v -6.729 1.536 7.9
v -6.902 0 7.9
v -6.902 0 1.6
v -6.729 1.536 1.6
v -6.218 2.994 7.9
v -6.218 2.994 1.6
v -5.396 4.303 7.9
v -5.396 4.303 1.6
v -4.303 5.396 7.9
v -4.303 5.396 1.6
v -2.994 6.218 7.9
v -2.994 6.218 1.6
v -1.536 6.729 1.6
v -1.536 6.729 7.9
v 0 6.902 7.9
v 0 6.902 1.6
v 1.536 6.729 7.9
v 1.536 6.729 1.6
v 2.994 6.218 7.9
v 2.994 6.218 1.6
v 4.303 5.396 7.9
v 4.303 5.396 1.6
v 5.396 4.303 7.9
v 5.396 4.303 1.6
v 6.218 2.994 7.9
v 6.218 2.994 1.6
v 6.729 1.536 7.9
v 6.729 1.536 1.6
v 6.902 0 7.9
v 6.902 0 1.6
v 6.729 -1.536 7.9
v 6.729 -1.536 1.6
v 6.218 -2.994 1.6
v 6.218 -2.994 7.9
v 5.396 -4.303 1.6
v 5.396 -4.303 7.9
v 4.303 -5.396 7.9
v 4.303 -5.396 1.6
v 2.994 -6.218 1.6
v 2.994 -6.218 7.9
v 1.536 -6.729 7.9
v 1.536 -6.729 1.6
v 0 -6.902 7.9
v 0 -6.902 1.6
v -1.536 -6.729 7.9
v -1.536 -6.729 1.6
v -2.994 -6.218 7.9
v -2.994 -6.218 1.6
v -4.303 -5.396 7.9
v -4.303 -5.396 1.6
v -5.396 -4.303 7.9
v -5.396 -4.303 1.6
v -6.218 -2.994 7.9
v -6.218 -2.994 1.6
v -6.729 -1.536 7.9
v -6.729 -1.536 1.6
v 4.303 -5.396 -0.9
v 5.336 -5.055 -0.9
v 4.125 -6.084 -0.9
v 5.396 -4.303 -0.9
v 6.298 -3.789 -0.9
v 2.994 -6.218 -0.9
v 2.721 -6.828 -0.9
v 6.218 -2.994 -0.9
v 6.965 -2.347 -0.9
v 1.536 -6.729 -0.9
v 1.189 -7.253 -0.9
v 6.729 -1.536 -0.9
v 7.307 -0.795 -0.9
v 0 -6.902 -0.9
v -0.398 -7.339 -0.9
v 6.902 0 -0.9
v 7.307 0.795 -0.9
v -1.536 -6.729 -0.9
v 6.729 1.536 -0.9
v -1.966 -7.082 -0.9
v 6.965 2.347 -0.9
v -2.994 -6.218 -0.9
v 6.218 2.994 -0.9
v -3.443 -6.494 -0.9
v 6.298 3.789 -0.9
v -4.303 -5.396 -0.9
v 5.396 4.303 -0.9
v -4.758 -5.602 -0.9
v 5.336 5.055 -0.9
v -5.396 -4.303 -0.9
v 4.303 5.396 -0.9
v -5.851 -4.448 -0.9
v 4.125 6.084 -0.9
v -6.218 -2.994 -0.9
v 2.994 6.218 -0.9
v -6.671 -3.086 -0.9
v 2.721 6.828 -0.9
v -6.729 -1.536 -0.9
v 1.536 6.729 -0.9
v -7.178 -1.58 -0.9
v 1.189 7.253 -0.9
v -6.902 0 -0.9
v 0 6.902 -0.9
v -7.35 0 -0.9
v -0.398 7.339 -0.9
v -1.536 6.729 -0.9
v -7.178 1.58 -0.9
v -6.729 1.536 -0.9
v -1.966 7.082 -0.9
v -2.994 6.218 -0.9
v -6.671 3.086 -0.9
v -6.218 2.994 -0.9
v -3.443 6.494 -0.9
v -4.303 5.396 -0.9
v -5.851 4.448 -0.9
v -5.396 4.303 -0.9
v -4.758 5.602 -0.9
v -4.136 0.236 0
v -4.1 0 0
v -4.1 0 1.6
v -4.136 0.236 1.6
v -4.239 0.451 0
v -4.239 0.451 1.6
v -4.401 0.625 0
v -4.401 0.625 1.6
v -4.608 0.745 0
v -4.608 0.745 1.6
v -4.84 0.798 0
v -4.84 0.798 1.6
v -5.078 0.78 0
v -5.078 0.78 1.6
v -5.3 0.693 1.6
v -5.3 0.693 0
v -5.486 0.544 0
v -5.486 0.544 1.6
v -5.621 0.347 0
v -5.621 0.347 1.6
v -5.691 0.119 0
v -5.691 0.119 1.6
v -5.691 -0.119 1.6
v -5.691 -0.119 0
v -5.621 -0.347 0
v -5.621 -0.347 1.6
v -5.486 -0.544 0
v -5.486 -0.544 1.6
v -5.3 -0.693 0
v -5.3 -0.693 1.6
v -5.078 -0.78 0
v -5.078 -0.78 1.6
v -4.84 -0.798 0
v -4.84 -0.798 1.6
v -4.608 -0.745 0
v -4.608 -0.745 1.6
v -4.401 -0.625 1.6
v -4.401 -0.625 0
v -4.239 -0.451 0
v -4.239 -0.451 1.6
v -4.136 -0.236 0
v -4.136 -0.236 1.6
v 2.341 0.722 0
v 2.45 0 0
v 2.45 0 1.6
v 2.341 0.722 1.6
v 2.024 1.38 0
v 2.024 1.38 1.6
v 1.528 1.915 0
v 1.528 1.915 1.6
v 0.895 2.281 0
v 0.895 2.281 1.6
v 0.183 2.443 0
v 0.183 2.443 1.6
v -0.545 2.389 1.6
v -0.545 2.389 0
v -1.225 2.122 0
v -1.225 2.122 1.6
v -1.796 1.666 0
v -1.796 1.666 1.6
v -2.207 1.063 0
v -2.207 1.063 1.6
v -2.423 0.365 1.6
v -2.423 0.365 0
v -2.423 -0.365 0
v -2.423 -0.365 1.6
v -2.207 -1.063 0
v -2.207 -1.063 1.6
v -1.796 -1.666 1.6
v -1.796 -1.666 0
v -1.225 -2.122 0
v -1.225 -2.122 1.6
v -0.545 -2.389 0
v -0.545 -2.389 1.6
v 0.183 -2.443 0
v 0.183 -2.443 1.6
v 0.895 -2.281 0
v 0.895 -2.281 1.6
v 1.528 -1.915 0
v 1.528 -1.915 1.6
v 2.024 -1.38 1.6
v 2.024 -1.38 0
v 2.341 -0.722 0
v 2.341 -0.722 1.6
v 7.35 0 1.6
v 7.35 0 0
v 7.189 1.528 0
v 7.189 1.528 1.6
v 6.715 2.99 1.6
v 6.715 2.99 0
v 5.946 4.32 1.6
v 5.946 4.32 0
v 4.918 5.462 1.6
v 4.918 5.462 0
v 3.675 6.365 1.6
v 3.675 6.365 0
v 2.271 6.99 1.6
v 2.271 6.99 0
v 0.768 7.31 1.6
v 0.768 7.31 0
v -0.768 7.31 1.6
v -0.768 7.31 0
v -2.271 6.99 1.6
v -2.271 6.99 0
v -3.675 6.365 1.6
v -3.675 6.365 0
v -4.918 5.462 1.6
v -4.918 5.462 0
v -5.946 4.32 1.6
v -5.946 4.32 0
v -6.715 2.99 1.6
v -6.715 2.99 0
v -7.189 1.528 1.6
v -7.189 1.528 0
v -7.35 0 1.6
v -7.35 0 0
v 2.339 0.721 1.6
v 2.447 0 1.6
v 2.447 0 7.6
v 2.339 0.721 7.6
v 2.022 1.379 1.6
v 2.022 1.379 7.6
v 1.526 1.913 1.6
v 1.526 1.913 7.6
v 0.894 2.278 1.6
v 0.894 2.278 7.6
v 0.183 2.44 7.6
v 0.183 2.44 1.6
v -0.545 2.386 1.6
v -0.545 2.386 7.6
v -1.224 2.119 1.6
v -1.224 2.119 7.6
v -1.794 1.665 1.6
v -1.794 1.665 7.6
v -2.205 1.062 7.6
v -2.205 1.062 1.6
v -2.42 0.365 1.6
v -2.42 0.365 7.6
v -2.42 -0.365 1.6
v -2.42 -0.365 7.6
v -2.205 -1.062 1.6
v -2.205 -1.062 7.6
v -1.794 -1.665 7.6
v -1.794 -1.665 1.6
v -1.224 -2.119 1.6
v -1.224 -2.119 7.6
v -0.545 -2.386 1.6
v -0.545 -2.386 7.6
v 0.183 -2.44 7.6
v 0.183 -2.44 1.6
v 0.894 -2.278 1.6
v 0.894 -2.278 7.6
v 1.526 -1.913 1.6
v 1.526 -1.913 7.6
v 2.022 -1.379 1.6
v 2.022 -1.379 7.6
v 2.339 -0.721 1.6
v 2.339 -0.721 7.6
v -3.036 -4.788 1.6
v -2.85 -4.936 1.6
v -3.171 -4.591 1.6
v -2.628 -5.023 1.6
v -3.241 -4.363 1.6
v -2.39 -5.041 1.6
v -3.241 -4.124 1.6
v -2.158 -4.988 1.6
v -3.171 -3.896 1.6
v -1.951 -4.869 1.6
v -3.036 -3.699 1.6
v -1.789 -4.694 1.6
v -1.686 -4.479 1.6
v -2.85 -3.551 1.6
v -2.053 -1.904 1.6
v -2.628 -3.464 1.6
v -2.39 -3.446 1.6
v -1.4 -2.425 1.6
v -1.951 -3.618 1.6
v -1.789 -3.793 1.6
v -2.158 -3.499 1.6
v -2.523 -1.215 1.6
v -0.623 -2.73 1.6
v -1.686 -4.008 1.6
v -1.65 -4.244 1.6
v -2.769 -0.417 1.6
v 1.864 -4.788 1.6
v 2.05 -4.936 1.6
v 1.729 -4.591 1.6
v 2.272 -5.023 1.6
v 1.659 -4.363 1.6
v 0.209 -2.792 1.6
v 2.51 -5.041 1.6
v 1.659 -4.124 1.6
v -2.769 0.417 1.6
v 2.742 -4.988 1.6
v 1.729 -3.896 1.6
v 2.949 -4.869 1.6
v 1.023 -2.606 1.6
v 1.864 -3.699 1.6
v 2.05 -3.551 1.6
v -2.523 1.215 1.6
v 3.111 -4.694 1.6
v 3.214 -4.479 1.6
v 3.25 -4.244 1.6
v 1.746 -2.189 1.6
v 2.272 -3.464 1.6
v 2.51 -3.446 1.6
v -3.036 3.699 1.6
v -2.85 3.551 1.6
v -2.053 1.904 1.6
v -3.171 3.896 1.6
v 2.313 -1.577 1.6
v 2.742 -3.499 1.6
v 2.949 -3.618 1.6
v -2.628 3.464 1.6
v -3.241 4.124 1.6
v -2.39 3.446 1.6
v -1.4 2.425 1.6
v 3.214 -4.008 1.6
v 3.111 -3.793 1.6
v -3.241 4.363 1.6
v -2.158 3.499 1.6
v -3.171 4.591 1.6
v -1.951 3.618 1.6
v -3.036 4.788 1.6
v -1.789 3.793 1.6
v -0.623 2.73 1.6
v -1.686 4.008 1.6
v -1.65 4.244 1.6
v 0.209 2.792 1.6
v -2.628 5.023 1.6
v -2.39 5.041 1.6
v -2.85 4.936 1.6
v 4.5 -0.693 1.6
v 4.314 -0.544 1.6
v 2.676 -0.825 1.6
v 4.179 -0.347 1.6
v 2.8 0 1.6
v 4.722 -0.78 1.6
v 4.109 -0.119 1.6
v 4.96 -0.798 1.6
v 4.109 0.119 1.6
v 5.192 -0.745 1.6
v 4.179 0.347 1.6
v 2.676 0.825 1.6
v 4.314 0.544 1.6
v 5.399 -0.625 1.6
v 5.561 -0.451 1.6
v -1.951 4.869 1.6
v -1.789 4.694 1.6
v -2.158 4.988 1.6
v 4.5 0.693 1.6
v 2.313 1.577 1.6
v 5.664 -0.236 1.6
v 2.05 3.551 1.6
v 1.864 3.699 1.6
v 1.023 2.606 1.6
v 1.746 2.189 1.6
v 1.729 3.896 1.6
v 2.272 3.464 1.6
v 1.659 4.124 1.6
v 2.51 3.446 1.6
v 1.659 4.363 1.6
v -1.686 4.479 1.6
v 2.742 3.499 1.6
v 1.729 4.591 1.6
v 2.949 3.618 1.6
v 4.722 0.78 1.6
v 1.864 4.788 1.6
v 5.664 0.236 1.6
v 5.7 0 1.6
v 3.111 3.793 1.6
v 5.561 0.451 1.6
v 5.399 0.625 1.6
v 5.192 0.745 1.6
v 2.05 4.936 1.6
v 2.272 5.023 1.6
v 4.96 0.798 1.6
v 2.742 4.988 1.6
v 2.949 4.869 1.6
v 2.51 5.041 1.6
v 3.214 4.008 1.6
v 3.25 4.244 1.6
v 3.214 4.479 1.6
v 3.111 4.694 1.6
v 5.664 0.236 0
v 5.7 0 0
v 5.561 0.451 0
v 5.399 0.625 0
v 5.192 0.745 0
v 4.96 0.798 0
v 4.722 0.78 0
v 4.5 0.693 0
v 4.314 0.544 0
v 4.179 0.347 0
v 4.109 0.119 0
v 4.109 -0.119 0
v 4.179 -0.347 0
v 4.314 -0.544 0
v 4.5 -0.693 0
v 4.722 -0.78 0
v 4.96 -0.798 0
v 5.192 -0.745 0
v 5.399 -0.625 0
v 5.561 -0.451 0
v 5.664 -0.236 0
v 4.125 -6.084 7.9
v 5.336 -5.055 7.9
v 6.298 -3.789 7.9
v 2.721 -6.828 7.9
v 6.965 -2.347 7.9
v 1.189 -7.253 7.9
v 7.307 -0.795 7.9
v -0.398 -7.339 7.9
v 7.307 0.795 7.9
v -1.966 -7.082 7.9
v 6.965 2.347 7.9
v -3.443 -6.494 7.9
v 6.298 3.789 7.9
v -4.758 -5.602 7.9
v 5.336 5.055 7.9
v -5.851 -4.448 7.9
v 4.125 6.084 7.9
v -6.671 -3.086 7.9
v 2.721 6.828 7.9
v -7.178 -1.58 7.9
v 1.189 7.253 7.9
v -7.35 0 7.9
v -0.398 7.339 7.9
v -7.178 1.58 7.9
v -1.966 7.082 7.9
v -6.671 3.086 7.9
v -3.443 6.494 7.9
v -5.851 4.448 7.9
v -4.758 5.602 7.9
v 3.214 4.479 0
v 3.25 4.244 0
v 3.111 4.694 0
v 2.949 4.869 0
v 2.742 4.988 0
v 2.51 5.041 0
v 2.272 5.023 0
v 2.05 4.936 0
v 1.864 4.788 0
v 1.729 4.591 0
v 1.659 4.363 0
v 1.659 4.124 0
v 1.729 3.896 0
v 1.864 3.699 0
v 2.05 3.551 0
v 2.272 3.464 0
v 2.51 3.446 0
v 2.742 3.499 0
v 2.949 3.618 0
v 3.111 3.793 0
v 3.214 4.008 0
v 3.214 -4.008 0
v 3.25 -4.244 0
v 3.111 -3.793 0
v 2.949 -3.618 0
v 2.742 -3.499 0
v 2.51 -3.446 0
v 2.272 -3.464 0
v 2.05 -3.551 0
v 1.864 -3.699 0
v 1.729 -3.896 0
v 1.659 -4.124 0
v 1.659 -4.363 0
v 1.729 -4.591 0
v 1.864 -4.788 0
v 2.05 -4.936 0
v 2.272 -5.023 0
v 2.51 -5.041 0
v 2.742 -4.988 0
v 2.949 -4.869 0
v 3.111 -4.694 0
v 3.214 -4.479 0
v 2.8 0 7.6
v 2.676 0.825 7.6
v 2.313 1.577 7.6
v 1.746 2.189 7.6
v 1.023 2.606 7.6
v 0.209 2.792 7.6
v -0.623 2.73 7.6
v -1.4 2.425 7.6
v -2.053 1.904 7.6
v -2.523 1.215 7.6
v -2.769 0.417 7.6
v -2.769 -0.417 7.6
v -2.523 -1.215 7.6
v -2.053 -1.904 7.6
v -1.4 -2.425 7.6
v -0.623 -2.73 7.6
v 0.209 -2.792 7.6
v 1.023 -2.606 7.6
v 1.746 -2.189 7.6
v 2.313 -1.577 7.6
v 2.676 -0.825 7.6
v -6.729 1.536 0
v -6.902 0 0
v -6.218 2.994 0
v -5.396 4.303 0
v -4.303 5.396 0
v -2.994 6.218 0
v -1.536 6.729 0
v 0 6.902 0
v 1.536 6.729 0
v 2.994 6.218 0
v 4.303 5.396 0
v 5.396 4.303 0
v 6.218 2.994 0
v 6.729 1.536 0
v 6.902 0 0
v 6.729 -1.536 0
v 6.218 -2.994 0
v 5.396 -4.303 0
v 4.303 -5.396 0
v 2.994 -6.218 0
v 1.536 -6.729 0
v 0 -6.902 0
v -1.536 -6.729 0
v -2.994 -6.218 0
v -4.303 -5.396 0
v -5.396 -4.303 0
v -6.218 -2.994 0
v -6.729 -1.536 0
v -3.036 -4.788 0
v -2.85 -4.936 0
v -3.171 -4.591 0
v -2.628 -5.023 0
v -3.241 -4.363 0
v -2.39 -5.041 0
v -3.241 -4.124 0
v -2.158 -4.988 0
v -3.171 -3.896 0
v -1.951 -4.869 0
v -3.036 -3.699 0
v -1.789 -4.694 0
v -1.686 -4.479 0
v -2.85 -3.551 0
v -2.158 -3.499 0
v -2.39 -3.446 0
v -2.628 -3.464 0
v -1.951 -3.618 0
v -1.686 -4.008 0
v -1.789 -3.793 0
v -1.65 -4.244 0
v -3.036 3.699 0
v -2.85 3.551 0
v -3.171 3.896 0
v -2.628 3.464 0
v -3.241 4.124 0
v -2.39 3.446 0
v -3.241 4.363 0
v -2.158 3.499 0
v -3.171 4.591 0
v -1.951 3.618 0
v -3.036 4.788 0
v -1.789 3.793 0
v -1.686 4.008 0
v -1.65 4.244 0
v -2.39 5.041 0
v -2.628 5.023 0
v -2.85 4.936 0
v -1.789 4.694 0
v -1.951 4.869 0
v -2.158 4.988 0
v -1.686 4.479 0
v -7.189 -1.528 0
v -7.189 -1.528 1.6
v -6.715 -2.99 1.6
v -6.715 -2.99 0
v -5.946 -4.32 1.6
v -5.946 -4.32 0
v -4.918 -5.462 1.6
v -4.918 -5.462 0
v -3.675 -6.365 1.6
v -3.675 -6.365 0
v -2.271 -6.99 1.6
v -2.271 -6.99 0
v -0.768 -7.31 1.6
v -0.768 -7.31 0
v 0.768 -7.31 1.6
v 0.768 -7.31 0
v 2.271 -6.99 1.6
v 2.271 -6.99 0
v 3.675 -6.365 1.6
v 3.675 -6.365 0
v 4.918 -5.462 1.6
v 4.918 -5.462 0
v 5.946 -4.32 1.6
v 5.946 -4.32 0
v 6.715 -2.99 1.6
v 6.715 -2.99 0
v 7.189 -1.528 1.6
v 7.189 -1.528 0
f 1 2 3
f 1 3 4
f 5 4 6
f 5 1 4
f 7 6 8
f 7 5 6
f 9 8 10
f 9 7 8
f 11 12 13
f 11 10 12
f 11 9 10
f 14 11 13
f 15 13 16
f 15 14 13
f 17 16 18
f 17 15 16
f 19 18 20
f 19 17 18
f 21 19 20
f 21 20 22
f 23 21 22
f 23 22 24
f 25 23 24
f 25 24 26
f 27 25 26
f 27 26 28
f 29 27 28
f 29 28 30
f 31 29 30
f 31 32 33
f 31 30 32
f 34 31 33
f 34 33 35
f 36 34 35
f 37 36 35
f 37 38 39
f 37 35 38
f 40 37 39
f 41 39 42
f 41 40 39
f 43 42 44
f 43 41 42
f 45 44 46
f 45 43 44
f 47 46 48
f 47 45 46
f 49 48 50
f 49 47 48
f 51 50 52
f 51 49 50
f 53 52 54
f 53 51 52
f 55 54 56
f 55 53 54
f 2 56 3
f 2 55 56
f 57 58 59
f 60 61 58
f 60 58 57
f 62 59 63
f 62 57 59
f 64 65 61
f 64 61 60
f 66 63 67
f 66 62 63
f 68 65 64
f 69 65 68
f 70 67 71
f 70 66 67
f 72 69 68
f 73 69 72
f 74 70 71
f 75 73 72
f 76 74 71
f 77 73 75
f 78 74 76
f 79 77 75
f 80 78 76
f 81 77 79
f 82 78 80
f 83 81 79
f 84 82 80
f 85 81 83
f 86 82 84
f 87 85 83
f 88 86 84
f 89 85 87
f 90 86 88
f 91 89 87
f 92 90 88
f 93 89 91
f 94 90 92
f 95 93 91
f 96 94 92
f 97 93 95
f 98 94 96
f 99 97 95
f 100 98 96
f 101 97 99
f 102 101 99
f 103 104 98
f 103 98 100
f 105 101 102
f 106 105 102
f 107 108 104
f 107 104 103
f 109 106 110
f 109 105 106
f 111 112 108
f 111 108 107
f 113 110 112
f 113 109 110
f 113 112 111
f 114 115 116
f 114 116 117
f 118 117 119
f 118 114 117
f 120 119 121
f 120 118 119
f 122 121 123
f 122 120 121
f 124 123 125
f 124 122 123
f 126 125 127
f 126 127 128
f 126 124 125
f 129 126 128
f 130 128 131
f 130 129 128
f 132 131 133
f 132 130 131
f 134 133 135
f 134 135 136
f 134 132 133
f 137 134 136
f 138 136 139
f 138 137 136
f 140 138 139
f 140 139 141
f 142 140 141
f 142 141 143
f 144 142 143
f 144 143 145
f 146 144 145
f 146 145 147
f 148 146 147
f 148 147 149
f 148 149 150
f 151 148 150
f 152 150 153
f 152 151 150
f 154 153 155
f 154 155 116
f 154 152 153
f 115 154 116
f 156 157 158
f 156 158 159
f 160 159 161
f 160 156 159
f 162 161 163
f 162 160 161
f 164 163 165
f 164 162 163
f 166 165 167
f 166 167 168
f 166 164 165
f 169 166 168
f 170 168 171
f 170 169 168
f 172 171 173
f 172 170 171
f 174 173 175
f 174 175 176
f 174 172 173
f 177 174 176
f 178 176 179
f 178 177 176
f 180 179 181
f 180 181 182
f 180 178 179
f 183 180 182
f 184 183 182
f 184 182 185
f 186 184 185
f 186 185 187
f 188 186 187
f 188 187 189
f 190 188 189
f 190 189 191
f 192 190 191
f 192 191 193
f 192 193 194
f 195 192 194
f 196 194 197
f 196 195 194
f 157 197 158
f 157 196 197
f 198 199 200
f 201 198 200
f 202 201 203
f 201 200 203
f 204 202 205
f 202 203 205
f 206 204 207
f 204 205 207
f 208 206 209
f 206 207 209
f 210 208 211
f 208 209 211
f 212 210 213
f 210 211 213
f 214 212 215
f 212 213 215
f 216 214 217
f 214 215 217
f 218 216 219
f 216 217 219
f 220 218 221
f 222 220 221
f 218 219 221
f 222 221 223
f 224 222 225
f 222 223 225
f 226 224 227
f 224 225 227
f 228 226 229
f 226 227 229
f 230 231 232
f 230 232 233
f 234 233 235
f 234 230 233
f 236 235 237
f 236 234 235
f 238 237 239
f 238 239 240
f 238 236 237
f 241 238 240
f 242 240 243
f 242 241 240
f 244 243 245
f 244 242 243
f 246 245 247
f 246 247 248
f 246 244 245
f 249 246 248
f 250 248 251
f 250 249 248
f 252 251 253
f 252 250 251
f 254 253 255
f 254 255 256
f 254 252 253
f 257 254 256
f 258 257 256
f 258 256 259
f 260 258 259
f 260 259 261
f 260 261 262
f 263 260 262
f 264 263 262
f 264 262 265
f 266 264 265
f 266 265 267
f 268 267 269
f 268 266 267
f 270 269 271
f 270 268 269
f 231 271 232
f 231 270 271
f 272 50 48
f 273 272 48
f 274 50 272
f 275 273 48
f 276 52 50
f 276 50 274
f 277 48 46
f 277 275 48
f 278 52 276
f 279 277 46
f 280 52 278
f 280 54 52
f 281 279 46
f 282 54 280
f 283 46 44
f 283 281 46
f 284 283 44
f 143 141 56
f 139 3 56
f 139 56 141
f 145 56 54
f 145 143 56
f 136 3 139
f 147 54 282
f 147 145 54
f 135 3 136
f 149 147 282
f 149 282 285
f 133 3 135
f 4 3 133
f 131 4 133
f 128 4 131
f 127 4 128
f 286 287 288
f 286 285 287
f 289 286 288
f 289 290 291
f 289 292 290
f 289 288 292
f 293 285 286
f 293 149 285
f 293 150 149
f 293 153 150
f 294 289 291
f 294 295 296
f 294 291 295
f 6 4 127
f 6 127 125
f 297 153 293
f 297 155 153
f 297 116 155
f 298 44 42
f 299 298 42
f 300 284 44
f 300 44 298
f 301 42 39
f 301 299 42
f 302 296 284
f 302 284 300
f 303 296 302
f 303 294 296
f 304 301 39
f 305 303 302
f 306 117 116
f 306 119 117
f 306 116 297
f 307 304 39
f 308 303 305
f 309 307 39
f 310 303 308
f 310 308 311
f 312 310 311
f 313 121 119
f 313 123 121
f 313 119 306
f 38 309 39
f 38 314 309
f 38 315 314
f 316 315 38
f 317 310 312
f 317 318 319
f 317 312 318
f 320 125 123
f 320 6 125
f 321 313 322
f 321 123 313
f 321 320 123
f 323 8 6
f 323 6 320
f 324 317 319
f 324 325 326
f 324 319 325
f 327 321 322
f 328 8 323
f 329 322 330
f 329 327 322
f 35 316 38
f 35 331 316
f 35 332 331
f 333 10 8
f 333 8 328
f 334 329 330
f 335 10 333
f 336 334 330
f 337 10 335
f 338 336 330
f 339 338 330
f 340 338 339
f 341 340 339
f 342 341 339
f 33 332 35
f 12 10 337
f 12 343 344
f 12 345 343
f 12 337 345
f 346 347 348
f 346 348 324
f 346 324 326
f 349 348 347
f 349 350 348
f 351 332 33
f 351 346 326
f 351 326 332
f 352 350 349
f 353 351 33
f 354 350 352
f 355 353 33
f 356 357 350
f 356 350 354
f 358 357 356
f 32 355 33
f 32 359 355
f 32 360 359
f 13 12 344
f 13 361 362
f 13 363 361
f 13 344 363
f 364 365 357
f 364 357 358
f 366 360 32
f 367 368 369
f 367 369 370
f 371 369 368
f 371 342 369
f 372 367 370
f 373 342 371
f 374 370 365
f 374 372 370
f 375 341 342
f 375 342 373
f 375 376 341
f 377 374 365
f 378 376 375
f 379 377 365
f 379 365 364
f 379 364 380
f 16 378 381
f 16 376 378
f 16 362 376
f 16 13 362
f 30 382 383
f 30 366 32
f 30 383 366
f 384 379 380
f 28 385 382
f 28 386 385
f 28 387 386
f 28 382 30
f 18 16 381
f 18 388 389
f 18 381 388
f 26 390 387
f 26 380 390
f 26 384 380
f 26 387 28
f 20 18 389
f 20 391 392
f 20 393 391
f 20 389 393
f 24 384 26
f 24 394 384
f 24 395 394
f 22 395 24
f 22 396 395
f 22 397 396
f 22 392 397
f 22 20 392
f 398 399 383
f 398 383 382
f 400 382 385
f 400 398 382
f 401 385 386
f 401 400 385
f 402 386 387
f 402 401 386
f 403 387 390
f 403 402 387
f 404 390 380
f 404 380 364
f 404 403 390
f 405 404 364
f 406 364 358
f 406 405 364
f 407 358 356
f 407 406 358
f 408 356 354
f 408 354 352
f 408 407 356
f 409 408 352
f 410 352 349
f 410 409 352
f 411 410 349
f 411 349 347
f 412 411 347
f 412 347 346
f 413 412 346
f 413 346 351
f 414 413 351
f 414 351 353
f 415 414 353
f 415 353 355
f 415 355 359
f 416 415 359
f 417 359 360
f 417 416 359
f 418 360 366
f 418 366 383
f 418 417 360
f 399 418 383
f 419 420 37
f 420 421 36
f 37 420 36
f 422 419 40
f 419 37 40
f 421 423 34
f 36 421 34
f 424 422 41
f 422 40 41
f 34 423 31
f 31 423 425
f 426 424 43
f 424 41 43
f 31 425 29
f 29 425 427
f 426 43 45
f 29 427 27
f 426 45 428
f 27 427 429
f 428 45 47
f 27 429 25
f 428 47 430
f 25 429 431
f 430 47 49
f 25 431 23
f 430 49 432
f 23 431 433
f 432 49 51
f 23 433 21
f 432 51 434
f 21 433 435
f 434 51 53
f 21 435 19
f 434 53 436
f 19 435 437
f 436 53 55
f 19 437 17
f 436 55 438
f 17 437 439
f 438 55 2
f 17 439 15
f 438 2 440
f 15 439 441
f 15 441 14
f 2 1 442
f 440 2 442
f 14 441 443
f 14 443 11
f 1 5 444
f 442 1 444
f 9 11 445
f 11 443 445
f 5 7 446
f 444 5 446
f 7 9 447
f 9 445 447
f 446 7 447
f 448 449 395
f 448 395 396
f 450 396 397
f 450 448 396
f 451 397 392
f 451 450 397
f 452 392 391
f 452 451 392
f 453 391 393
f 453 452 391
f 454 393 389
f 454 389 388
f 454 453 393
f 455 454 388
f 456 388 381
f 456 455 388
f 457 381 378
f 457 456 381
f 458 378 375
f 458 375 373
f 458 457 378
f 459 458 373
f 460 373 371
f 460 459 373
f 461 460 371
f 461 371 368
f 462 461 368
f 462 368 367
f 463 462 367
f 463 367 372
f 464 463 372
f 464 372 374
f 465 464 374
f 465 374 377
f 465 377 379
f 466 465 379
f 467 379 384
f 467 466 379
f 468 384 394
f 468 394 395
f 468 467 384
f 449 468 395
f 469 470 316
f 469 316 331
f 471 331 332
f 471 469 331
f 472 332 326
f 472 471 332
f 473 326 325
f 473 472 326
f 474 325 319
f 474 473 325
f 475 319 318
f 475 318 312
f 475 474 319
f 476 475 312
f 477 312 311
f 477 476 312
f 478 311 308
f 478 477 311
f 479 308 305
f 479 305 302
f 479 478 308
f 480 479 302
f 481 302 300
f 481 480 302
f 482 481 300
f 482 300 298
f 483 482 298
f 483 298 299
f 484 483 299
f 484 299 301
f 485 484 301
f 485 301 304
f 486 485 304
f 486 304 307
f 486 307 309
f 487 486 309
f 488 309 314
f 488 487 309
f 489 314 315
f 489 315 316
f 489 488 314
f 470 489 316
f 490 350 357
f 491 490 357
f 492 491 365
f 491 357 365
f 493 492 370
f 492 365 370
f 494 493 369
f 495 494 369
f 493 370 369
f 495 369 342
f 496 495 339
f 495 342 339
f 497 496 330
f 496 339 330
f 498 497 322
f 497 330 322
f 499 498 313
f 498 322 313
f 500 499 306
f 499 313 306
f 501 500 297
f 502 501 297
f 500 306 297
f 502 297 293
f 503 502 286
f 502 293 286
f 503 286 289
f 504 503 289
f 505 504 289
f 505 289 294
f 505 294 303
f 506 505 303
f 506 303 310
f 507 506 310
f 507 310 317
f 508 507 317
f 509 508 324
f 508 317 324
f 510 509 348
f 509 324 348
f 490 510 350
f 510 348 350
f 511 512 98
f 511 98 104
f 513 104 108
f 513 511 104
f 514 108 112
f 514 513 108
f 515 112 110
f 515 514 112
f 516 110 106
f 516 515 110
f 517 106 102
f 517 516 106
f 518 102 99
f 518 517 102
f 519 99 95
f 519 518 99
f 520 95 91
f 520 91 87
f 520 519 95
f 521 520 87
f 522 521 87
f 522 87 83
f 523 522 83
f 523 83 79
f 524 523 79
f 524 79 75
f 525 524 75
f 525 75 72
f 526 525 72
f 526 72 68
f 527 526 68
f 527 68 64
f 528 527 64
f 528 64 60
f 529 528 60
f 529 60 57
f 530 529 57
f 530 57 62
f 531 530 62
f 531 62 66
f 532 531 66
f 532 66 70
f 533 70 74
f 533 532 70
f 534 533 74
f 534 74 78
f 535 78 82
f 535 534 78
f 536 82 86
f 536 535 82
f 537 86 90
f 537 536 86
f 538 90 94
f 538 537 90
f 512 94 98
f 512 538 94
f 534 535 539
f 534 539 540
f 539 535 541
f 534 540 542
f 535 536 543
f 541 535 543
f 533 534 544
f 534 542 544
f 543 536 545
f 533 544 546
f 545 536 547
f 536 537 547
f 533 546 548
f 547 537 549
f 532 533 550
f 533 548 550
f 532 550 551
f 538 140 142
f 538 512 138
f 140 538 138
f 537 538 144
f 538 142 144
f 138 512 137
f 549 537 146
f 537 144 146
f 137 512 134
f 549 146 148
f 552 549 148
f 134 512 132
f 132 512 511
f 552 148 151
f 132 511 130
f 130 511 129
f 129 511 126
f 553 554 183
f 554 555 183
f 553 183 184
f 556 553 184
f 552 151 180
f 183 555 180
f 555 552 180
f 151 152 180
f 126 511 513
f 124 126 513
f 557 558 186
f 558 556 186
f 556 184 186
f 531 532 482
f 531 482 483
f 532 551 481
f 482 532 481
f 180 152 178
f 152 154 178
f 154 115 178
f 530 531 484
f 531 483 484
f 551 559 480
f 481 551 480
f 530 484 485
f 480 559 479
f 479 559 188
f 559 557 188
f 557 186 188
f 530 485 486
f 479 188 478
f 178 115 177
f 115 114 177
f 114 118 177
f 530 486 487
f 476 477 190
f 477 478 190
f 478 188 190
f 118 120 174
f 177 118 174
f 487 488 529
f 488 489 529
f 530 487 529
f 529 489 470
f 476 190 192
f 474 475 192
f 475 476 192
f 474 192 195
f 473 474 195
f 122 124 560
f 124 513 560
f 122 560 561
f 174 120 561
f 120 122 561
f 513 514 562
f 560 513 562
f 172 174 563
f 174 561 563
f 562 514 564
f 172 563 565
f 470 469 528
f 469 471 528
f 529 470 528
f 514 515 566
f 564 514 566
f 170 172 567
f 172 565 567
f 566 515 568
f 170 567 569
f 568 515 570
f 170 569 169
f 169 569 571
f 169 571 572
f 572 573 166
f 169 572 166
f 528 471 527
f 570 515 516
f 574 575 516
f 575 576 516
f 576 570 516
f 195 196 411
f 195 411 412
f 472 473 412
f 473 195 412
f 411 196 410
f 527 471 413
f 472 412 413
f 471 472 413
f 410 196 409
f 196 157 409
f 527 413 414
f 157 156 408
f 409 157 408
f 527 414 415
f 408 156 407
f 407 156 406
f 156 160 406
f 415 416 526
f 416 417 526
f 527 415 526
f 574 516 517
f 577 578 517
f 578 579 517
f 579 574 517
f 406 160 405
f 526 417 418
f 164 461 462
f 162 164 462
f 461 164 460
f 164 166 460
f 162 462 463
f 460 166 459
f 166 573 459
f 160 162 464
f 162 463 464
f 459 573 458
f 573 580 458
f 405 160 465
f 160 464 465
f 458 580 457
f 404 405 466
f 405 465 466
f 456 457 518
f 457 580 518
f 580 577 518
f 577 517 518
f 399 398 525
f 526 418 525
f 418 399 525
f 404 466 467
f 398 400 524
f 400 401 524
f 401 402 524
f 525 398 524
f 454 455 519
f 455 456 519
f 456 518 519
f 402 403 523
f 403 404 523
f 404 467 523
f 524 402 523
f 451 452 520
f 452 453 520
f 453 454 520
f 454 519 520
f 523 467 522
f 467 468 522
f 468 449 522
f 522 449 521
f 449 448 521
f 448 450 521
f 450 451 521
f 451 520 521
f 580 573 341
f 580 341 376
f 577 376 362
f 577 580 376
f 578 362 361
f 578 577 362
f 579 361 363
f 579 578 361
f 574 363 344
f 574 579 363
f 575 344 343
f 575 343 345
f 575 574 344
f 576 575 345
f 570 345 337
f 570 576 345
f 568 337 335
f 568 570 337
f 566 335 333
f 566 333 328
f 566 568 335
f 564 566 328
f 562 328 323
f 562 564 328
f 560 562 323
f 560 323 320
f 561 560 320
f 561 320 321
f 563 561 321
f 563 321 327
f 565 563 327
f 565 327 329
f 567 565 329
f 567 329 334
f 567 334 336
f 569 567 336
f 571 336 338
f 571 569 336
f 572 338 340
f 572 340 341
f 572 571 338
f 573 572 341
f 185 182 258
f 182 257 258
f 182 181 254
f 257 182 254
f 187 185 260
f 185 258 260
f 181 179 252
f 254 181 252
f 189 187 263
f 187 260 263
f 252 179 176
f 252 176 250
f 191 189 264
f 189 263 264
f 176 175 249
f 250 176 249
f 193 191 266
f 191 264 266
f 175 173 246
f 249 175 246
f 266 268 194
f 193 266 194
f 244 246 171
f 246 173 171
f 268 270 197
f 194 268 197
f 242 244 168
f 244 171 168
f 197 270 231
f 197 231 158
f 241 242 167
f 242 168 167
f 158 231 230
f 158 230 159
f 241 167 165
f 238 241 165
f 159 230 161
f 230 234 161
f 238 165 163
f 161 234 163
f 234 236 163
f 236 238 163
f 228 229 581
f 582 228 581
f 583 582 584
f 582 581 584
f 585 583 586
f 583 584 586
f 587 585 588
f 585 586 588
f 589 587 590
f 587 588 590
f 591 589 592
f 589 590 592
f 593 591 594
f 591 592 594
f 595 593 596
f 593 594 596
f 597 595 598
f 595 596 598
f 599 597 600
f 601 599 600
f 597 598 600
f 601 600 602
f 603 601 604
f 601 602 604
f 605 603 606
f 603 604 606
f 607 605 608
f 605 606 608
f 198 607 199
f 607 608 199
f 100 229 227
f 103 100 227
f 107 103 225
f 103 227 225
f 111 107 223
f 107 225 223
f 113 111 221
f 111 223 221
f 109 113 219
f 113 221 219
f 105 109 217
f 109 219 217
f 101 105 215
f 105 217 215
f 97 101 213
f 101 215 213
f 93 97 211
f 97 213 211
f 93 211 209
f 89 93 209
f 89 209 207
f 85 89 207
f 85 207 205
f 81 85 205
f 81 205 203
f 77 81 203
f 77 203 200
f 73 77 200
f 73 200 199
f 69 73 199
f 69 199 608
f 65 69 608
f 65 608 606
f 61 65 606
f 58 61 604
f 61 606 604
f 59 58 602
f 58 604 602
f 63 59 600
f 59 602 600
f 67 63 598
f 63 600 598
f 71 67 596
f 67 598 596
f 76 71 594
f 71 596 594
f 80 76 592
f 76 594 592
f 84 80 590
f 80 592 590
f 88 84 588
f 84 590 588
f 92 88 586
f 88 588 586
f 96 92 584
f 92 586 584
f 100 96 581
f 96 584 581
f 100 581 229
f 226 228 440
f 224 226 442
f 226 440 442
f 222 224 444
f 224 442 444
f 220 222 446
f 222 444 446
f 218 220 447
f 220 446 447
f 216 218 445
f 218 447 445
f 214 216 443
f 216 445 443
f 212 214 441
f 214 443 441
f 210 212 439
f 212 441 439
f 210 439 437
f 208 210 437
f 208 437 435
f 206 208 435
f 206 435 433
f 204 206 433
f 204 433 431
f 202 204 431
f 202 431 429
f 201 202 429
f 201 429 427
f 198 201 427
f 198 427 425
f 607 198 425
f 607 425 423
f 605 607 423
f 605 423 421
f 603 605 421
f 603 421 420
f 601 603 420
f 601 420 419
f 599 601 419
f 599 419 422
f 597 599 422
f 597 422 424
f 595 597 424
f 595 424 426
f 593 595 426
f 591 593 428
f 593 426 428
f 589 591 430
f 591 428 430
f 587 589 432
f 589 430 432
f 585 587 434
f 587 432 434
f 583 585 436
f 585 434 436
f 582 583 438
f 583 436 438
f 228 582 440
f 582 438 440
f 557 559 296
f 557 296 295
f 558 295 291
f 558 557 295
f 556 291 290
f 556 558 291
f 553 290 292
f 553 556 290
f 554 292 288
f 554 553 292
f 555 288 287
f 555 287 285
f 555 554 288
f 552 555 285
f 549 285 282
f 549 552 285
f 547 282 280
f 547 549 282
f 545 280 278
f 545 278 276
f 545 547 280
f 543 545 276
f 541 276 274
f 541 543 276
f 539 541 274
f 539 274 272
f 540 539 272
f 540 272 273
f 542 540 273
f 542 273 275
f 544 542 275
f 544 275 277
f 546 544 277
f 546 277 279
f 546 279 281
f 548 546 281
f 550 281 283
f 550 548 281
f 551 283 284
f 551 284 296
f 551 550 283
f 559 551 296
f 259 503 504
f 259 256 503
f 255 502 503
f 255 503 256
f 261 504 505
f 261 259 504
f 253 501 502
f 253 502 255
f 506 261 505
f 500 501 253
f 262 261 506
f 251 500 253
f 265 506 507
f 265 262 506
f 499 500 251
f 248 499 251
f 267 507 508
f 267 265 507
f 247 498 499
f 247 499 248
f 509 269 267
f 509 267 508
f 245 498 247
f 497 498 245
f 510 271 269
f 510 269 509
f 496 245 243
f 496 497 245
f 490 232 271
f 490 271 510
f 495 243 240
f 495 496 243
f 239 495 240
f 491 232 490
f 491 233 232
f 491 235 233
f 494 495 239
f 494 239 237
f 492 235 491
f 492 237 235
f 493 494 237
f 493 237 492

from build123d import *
from build123d.topology import SkipClean

# Parameters (mm, degrees)
SKETCH1_R                = 7.35
SKETCH1_R_2              = 2.45
SKETCH1_R_3              = 0.8
BOSS_EXTRUDE1_DEPTH      = 1.6
SKETCH2_R                = 2.8
SKETCH2_R_2              = 2.447265978
BOSS_EXTRUDE3_DEPTH      = 6
BOSS_EXTRUDE4_DEPTH      = 0.9
BOSS_EXTRUDE4_DEPTH_BACK = 7.9
SKETCH3_R                = 7.35
SKETCH3_R_2              = 6.901593367


with BuildPart() as part:
    # Sketch1 → Boss-Extrude1 (new body)
    with BuildSketch(Plane.XY):
        Circle(SKETCH1_R)
        Circle(SKETCH1_R_2, mode=Mode.SUBTRACT)
        with Locations((-4.9, 0)):
            Circle(SKETCH1_R_3, mode=Mode.SUBTRACT)
        with Locations((-2.45, 4.243524479)):
            Circle(SKETCH1_R_3, mode=Mode.SUBTRACT)
        with Locations((2.45, 4.243524479)):
            Circle(SKETCH1_R_3, mode=Mode.SUBTRACT)
        with Locations((4.9, 0)):
            Circle(SKETCH1_R_3, mode=Mode.SUBTRACT)
        with Locations((2.45, -4.243524479)):
            Circle(SKETCH1_R_3, mode=Mode.SUBTRACT)
        with Locations((-2.45, -4.243524479)):
            Circle(SKETCH1_R_3, mode=Mode.SUBTRACT)
    extrude(amount=BOSS_EXTRUDE1_DEPTH)

    # Sketch2 → Boss-Extrude3 (add)
    with BuildSketch(Plane.XY.offset(1.6)):
        Circle(SKETCH2_R)
        Circle(SKETCH2_R_2, mode=Mode.SUBTRACT)
    extrude(amount=BOSS_EXTRUDE3_DEPTH)

    # Sketch3 → Boss-Extrude4 (add, two sides: drawn at the far end of the back side and taken through both)
    with SkipClean():  # the faces are left unmerged after this step: merging them gives an invalid solid
        with BuildSketch(Plane(origin=(0, 0, 0), x_dir=(-1, 0, 0), z_dir=(0, 0, -1)).offset(-BOSS_EXTRUDE4_DEPTH_BACK)):
            Circle(SKETCH3_R)
            Circle(SKETCH3_R_2, mode=Mode.SUBTRACT)
        extrude(amount=BOSS_EXTRUDE4_DEPTH + BOSS_EXTRUDE4_DEPTH_BACK)


solid = part.part
